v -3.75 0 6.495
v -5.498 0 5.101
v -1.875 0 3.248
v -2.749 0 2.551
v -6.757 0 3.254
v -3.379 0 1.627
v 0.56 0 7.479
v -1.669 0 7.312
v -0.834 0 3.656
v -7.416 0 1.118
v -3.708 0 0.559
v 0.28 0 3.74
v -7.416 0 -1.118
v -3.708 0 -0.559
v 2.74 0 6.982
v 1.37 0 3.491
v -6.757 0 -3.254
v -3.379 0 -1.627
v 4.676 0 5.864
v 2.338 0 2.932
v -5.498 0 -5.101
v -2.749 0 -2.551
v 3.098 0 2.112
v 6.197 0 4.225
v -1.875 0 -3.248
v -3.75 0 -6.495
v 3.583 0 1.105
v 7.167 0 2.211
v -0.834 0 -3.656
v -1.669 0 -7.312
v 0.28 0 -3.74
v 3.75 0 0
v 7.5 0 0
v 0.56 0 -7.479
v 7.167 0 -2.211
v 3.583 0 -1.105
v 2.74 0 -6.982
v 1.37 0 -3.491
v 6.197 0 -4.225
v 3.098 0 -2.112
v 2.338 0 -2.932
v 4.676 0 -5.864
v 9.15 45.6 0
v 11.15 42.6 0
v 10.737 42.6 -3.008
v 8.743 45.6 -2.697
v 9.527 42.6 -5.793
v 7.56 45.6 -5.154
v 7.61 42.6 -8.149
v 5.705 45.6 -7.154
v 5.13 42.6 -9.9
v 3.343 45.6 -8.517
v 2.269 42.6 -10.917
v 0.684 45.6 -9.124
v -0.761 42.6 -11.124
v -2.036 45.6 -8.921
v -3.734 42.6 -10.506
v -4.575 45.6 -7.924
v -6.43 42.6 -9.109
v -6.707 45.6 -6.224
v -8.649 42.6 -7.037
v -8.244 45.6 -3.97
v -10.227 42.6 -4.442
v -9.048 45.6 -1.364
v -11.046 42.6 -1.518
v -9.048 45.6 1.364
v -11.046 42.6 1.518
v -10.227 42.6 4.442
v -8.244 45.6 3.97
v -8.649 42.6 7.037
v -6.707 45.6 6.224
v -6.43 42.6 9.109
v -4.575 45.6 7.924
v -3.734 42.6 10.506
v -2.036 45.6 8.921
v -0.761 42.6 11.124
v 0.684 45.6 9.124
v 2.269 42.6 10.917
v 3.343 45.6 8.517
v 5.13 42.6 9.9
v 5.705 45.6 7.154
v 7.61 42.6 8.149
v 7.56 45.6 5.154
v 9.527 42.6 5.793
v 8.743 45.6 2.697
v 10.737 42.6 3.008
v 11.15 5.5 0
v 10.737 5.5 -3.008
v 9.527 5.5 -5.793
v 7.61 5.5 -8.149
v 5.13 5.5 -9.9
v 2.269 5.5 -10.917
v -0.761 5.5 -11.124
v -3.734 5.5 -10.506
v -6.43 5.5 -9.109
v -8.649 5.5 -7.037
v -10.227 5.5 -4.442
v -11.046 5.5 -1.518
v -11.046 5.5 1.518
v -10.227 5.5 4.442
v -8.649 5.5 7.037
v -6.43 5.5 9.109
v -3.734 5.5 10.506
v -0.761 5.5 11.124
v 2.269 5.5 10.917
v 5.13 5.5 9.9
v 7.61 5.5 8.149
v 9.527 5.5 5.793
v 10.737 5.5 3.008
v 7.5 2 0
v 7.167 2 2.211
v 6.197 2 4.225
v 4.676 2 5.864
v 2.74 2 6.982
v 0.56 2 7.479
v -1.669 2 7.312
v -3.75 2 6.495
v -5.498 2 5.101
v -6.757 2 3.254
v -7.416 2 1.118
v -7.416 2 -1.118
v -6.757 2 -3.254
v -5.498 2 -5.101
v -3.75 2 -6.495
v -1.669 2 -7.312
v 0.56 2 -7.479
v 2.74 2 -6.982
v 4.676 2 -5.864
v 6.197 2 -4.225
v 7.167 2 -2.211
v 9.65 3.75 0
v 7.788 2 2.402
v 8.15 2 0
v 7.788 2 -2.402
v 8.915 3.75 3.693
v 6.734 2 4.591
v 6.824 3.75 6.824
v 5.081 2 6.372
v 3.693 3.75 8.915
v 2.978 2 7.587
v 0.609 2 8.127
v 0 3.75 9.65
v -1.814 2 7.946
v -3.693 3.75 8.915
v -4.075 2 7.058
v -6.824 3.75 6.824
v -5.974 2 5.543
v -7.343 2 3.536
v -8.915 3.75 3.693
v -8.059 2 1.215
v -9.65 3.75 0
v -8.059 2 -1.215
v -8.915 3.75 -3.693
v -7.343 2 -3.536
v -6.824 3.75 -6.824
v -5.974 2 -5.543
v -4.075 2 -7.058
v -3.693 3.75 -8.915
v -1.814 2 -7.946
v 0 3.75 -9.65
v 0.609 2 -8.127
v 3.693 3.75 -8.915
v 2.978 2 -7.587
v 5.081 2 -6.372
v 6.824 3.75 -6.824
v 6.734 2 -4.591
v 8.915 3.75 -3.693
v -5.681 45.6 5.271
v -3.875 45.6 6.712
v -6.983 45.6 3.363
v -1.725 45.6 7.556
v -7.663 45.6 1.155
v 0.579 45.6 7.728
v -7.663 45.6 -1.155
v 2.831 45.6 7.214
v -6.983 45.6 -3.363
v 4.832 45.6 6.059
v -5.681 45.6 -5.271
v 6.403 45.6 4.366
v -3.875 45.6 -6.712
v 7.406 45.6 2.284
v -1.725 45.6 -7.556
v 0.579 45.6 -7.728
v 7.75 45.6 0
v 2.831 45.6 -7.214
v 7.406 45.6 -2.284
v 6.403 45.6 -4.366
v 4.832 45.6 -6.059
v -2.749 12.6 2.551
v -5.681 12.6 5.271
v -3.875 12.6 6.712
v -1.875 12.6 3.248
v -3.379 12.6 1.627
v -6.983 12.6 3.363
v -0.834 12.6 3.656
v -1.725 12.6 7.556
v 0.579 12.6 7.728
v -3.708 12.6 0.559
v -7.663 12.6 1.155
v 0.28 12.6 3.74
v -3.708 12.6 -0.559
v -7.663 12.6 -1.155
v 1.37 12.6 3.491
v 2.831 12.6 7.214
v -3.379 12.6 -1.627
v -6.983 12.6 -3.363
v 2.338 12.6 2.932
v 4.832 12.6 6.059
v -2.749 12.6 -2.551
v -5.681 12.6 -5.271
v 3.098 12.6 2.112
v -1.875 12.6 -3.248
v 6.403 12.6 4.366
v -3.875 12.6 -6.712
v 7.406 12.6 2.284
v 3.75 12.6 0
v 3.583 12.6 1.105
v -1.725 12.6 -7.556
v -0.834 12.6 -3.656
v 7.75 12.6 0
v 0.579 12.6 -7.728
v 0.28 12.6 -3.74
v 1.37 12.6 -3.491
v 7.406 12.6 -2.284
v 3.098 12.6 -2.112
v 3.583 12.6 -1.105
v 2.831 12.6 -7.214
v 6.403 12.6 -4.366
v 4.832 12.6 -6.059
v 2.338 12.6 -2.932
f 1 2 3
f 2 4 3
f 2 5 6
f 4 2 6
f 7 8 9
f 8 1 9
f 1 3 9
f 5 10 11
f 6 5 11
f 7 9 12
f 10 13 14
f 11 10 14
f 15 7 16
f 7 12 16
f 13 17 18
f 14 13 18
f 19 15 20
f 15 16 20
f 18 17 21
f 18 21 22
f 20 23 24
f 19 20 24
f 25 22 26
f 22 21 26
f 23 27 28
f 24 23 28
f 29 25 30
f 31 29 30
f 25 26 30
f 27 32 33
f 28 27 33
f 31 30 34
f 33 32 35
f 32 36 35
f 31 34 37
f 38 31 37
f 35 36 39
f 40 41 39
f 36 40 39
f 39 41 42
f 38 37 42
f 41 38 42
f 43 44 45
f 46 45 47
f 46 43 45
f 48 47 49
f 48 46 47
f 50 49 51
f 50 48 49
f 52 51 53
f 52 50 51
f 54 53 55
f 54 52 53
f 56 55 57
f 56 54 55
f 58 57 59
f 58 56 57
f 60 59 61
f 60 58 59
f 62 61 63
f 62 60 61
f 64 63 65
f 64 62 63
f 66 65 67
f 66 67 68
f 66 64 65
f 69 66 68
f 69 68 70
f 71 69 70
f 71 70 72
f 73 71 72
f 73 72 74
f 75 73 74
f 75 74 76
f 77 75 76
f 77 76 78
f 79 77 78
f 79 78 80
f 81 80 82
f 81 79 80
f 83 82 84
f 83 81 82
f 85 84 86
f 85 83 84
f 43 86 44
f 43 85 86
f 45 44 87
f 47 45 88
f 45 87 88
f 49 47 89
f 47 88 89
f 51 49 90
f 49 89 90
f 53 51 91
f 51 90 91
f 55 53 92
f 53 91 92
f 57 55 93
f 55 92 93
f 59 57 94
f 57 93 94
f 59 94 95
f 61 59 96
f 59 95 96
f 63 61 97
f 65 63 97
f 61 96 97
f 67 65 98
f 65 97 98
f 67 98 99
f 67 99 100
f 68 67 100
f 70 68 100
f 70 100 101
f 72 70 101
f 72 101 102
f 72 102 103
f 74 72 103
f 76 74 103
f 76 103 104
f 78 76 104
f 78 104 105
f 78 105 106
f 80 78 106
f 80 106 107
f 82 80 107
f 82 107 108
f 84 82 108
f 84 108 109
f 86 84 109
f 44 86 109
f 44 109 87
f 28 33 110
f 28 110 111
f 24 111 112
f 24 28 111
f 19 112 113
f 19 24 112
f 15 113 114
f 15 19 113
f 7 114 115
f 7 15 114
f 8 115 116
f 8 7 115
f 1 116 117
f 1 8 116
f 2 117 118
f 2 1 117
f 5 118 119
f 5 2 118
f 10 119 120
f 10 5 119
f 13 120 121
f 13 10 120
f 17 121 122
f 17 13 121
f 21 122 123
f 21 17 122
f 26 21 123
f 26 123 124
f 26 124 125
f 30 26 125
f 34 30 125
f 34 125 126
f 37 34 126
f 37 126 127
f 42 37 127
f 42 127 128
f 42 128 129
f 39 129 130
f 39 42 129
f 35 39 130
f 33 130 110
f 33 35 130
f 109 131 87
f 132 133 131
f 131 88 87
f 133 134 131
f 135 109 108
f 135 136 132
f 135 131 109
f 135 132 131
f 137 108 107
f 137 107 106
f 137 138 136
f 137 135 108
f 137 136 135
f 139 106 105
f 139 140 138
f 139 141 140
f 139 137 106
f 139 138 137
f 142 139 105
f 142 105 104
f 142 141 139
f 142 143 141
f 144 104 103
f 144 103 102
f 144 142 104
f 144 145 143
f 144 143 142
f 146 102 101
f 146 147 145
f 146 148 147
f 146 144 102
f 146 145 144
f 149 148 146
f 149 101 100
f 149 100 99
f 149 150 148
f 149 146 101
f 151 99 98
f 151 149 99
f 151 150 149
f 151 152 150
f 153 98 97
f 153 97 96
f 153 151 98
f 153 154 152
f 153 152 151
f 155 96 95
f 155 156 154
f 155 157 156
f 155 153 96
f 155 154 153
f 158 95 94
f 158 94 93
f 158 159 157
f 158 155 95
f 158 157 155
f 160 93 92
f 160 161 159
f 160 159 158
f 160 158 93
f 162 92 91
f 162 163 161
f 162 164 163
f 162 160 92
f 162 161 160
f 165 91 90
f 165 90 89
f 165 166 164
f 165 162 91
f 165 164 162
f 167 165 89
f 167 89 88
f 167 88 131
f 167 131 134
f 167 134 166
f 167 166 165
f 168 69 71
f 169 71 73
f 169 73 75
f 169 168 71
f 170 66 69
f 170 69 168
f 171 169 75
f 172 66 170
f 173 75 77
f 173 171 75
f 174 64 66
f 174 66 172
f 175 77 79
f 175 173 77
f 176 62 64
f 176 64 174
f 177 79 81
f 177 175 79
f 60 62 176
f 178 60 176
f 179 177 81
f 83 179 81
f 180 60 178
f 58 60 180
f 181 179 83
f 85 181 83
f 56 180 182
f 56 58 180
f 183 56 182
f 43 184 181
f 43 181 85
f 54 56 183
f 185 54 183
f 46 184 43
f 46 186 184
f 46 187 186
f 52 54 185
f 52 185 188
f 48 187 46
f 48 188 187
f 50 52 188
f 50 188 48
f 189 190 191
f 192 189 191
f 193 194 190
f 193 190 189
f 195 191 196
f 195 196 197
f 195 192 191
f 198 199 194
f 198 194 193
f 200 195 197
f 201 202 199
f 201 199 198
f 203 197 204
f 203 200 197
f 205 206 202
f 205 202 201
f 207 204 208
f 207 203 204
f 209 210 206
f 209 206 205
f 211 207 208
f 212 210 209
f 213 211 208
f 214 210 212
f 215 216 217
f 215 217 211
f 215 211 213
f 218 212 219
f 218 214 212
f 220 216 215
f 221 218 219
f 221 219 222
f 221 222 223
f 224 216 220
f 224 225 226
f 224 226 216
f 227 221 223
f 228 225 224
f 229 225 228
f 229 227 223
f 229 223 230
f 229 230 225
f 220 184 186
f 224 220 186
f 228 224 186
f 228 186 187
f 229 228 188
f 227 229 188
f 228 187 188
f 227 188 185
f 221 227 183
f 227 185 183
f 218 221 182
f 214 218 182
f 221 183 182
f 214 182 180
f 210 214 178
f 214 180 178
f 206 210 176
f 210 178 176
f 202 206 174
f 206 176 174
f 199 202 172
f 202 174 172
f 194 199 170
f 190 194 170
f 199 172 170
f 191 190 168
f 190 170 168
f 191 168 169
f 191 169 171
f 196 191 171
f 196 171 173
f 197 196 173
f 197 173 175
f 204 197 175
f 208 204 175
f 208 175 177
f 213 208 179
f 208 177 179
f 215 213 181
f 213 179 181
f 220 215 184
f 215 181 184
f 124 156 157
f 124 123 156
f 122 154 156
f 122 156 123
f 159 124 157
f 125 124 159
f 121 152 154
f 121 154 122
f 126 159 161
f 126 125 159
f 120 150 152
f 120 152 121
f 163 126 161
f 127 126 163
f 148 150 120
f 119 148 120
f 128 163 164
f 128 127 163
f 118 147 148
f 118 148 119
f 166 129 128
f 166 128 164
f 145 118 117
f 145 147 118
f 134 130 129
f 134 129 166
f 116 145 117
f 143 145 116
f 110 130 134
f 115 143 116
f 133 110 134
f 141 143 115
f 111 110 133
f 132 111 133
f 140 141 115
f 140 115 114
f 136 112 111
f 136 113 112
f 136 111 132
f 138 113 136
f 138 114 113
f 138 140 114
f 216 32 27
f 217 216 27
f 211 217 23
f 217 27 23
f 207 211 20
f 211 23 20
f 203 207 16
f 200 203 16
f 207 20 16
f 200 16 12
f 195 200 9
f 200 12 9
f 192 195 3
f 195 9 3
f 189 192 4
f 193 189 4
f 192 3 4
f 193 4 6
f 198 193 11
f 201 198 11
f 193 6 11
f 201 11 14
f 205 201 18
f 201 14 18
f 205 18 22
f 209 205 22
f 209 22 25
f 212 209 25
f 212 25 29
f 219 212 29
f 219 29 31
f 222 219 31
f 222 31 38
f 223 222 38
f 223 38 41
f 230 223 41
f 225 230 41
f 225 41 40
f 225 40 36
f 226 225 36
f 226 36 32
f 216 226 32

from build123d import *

# Parameters (mm, degrees)
ESQUISSE1_R             = 11.15
BOSS_EXTRU_1_DEPTH      = 45.6
ESQUISSE2_R             = 7.75
ENL_V_MAT_EXTRU_1_DEPTH = 33
ESQUISSE3_R             = 11.15
ESQUISSE3_R_2           = 7.5
ENL_V_MAT_EXTRU_2_DEPTH = 2
ESQUISSE4_R             = 3.75
ENL_V_MAT_EXTRU_3_DEPTH = 46.6
CHANFREIN1_SIZE         = 3
CHANFREIN1_SIZE2        = 2
CHANFREIN2_SIZE         = 3.5
CHANFREIN2_SIZE2        = 3


with BuildPart() as part:
    # Esquisse1 → Boss.-Extru.1 (new body)
    with BuildSketch(Plane(origin=(0, 0, 0), x_dir=(1, 0, 0), z_dir=(0, 1, 0))):
        Circle(ESQUISSE1_R)
    extrude(amount=BOSS_EXTRU_1_DEPTH)

    # Esquisse2 → Enlèv. mat.-Extru.1 (cut)
    with BuildSketch(Plane(origin=(0, 45.6, 0), x_dir=(1, 0, 0), z_dir=(0, 1, 0))):
        Circle(ESQUISSE2_R)
    extrude(amount=-ENL_V_MAT_EXTRU_1_DEPTH, mode=Mode.SUBTRACT)

    # Esquisse3 → Enlèv. mat.-Extru.2 (cut)
    with BuildSketch(Plane.XZ):
        Circle(ESQUISSE3_R)
        Circle(ESQUISSE3_R_2, mode=Mode.SUBTRACT)
    extrude(amount=-ENL_V_MAT_EXTRU_2_DEPTH, mode=Mode.SUBTRACT)

    # Esquisse4 → Enlèv. mat.-Extru.3 (cut, through all)
    with BuildSketch(Plane.XZ):
        Circle(ESQUISSE4_R)
    extrude(amount=-ENL_V_MAT_EXTRU_3_DEPTH, mode=Mode.SUBTRACT)

    # Chanfrein1
    chanfrein1_edges = [part.edges().sort_by_distance(p)[0] for p in [
        (-11.15, 45.6, 0),
    ]]
    chanfrein1_side = [part.faces().sort_by_distance(p)[0] for p in [
        (-11.15, 23.8, 0),
    ]]
    chamfer(chanfrein1_edges, length=CHANFREIN1_SIZE, length2=CHANFREIN1_SIZE2, reference=chanfrein1_side[0])

    # Chanfrein2
    chanfrein2_edges = [part.edges().sort_by_distance(p)[0] for p in [
        (-11.15, 2, 0),
    ]]
    chanfrein2_side = [part.faces().sort_by_distance(p)[0] for p in [
        (-11.15, 22.3, 0),
    ]]
    chamfer(chanfrein2_edges, length=CHANFREIN2_SIZE, length2=CHANFREIN2_SIZE2, reference=chanfrein2_side[0])


solid = part.part
